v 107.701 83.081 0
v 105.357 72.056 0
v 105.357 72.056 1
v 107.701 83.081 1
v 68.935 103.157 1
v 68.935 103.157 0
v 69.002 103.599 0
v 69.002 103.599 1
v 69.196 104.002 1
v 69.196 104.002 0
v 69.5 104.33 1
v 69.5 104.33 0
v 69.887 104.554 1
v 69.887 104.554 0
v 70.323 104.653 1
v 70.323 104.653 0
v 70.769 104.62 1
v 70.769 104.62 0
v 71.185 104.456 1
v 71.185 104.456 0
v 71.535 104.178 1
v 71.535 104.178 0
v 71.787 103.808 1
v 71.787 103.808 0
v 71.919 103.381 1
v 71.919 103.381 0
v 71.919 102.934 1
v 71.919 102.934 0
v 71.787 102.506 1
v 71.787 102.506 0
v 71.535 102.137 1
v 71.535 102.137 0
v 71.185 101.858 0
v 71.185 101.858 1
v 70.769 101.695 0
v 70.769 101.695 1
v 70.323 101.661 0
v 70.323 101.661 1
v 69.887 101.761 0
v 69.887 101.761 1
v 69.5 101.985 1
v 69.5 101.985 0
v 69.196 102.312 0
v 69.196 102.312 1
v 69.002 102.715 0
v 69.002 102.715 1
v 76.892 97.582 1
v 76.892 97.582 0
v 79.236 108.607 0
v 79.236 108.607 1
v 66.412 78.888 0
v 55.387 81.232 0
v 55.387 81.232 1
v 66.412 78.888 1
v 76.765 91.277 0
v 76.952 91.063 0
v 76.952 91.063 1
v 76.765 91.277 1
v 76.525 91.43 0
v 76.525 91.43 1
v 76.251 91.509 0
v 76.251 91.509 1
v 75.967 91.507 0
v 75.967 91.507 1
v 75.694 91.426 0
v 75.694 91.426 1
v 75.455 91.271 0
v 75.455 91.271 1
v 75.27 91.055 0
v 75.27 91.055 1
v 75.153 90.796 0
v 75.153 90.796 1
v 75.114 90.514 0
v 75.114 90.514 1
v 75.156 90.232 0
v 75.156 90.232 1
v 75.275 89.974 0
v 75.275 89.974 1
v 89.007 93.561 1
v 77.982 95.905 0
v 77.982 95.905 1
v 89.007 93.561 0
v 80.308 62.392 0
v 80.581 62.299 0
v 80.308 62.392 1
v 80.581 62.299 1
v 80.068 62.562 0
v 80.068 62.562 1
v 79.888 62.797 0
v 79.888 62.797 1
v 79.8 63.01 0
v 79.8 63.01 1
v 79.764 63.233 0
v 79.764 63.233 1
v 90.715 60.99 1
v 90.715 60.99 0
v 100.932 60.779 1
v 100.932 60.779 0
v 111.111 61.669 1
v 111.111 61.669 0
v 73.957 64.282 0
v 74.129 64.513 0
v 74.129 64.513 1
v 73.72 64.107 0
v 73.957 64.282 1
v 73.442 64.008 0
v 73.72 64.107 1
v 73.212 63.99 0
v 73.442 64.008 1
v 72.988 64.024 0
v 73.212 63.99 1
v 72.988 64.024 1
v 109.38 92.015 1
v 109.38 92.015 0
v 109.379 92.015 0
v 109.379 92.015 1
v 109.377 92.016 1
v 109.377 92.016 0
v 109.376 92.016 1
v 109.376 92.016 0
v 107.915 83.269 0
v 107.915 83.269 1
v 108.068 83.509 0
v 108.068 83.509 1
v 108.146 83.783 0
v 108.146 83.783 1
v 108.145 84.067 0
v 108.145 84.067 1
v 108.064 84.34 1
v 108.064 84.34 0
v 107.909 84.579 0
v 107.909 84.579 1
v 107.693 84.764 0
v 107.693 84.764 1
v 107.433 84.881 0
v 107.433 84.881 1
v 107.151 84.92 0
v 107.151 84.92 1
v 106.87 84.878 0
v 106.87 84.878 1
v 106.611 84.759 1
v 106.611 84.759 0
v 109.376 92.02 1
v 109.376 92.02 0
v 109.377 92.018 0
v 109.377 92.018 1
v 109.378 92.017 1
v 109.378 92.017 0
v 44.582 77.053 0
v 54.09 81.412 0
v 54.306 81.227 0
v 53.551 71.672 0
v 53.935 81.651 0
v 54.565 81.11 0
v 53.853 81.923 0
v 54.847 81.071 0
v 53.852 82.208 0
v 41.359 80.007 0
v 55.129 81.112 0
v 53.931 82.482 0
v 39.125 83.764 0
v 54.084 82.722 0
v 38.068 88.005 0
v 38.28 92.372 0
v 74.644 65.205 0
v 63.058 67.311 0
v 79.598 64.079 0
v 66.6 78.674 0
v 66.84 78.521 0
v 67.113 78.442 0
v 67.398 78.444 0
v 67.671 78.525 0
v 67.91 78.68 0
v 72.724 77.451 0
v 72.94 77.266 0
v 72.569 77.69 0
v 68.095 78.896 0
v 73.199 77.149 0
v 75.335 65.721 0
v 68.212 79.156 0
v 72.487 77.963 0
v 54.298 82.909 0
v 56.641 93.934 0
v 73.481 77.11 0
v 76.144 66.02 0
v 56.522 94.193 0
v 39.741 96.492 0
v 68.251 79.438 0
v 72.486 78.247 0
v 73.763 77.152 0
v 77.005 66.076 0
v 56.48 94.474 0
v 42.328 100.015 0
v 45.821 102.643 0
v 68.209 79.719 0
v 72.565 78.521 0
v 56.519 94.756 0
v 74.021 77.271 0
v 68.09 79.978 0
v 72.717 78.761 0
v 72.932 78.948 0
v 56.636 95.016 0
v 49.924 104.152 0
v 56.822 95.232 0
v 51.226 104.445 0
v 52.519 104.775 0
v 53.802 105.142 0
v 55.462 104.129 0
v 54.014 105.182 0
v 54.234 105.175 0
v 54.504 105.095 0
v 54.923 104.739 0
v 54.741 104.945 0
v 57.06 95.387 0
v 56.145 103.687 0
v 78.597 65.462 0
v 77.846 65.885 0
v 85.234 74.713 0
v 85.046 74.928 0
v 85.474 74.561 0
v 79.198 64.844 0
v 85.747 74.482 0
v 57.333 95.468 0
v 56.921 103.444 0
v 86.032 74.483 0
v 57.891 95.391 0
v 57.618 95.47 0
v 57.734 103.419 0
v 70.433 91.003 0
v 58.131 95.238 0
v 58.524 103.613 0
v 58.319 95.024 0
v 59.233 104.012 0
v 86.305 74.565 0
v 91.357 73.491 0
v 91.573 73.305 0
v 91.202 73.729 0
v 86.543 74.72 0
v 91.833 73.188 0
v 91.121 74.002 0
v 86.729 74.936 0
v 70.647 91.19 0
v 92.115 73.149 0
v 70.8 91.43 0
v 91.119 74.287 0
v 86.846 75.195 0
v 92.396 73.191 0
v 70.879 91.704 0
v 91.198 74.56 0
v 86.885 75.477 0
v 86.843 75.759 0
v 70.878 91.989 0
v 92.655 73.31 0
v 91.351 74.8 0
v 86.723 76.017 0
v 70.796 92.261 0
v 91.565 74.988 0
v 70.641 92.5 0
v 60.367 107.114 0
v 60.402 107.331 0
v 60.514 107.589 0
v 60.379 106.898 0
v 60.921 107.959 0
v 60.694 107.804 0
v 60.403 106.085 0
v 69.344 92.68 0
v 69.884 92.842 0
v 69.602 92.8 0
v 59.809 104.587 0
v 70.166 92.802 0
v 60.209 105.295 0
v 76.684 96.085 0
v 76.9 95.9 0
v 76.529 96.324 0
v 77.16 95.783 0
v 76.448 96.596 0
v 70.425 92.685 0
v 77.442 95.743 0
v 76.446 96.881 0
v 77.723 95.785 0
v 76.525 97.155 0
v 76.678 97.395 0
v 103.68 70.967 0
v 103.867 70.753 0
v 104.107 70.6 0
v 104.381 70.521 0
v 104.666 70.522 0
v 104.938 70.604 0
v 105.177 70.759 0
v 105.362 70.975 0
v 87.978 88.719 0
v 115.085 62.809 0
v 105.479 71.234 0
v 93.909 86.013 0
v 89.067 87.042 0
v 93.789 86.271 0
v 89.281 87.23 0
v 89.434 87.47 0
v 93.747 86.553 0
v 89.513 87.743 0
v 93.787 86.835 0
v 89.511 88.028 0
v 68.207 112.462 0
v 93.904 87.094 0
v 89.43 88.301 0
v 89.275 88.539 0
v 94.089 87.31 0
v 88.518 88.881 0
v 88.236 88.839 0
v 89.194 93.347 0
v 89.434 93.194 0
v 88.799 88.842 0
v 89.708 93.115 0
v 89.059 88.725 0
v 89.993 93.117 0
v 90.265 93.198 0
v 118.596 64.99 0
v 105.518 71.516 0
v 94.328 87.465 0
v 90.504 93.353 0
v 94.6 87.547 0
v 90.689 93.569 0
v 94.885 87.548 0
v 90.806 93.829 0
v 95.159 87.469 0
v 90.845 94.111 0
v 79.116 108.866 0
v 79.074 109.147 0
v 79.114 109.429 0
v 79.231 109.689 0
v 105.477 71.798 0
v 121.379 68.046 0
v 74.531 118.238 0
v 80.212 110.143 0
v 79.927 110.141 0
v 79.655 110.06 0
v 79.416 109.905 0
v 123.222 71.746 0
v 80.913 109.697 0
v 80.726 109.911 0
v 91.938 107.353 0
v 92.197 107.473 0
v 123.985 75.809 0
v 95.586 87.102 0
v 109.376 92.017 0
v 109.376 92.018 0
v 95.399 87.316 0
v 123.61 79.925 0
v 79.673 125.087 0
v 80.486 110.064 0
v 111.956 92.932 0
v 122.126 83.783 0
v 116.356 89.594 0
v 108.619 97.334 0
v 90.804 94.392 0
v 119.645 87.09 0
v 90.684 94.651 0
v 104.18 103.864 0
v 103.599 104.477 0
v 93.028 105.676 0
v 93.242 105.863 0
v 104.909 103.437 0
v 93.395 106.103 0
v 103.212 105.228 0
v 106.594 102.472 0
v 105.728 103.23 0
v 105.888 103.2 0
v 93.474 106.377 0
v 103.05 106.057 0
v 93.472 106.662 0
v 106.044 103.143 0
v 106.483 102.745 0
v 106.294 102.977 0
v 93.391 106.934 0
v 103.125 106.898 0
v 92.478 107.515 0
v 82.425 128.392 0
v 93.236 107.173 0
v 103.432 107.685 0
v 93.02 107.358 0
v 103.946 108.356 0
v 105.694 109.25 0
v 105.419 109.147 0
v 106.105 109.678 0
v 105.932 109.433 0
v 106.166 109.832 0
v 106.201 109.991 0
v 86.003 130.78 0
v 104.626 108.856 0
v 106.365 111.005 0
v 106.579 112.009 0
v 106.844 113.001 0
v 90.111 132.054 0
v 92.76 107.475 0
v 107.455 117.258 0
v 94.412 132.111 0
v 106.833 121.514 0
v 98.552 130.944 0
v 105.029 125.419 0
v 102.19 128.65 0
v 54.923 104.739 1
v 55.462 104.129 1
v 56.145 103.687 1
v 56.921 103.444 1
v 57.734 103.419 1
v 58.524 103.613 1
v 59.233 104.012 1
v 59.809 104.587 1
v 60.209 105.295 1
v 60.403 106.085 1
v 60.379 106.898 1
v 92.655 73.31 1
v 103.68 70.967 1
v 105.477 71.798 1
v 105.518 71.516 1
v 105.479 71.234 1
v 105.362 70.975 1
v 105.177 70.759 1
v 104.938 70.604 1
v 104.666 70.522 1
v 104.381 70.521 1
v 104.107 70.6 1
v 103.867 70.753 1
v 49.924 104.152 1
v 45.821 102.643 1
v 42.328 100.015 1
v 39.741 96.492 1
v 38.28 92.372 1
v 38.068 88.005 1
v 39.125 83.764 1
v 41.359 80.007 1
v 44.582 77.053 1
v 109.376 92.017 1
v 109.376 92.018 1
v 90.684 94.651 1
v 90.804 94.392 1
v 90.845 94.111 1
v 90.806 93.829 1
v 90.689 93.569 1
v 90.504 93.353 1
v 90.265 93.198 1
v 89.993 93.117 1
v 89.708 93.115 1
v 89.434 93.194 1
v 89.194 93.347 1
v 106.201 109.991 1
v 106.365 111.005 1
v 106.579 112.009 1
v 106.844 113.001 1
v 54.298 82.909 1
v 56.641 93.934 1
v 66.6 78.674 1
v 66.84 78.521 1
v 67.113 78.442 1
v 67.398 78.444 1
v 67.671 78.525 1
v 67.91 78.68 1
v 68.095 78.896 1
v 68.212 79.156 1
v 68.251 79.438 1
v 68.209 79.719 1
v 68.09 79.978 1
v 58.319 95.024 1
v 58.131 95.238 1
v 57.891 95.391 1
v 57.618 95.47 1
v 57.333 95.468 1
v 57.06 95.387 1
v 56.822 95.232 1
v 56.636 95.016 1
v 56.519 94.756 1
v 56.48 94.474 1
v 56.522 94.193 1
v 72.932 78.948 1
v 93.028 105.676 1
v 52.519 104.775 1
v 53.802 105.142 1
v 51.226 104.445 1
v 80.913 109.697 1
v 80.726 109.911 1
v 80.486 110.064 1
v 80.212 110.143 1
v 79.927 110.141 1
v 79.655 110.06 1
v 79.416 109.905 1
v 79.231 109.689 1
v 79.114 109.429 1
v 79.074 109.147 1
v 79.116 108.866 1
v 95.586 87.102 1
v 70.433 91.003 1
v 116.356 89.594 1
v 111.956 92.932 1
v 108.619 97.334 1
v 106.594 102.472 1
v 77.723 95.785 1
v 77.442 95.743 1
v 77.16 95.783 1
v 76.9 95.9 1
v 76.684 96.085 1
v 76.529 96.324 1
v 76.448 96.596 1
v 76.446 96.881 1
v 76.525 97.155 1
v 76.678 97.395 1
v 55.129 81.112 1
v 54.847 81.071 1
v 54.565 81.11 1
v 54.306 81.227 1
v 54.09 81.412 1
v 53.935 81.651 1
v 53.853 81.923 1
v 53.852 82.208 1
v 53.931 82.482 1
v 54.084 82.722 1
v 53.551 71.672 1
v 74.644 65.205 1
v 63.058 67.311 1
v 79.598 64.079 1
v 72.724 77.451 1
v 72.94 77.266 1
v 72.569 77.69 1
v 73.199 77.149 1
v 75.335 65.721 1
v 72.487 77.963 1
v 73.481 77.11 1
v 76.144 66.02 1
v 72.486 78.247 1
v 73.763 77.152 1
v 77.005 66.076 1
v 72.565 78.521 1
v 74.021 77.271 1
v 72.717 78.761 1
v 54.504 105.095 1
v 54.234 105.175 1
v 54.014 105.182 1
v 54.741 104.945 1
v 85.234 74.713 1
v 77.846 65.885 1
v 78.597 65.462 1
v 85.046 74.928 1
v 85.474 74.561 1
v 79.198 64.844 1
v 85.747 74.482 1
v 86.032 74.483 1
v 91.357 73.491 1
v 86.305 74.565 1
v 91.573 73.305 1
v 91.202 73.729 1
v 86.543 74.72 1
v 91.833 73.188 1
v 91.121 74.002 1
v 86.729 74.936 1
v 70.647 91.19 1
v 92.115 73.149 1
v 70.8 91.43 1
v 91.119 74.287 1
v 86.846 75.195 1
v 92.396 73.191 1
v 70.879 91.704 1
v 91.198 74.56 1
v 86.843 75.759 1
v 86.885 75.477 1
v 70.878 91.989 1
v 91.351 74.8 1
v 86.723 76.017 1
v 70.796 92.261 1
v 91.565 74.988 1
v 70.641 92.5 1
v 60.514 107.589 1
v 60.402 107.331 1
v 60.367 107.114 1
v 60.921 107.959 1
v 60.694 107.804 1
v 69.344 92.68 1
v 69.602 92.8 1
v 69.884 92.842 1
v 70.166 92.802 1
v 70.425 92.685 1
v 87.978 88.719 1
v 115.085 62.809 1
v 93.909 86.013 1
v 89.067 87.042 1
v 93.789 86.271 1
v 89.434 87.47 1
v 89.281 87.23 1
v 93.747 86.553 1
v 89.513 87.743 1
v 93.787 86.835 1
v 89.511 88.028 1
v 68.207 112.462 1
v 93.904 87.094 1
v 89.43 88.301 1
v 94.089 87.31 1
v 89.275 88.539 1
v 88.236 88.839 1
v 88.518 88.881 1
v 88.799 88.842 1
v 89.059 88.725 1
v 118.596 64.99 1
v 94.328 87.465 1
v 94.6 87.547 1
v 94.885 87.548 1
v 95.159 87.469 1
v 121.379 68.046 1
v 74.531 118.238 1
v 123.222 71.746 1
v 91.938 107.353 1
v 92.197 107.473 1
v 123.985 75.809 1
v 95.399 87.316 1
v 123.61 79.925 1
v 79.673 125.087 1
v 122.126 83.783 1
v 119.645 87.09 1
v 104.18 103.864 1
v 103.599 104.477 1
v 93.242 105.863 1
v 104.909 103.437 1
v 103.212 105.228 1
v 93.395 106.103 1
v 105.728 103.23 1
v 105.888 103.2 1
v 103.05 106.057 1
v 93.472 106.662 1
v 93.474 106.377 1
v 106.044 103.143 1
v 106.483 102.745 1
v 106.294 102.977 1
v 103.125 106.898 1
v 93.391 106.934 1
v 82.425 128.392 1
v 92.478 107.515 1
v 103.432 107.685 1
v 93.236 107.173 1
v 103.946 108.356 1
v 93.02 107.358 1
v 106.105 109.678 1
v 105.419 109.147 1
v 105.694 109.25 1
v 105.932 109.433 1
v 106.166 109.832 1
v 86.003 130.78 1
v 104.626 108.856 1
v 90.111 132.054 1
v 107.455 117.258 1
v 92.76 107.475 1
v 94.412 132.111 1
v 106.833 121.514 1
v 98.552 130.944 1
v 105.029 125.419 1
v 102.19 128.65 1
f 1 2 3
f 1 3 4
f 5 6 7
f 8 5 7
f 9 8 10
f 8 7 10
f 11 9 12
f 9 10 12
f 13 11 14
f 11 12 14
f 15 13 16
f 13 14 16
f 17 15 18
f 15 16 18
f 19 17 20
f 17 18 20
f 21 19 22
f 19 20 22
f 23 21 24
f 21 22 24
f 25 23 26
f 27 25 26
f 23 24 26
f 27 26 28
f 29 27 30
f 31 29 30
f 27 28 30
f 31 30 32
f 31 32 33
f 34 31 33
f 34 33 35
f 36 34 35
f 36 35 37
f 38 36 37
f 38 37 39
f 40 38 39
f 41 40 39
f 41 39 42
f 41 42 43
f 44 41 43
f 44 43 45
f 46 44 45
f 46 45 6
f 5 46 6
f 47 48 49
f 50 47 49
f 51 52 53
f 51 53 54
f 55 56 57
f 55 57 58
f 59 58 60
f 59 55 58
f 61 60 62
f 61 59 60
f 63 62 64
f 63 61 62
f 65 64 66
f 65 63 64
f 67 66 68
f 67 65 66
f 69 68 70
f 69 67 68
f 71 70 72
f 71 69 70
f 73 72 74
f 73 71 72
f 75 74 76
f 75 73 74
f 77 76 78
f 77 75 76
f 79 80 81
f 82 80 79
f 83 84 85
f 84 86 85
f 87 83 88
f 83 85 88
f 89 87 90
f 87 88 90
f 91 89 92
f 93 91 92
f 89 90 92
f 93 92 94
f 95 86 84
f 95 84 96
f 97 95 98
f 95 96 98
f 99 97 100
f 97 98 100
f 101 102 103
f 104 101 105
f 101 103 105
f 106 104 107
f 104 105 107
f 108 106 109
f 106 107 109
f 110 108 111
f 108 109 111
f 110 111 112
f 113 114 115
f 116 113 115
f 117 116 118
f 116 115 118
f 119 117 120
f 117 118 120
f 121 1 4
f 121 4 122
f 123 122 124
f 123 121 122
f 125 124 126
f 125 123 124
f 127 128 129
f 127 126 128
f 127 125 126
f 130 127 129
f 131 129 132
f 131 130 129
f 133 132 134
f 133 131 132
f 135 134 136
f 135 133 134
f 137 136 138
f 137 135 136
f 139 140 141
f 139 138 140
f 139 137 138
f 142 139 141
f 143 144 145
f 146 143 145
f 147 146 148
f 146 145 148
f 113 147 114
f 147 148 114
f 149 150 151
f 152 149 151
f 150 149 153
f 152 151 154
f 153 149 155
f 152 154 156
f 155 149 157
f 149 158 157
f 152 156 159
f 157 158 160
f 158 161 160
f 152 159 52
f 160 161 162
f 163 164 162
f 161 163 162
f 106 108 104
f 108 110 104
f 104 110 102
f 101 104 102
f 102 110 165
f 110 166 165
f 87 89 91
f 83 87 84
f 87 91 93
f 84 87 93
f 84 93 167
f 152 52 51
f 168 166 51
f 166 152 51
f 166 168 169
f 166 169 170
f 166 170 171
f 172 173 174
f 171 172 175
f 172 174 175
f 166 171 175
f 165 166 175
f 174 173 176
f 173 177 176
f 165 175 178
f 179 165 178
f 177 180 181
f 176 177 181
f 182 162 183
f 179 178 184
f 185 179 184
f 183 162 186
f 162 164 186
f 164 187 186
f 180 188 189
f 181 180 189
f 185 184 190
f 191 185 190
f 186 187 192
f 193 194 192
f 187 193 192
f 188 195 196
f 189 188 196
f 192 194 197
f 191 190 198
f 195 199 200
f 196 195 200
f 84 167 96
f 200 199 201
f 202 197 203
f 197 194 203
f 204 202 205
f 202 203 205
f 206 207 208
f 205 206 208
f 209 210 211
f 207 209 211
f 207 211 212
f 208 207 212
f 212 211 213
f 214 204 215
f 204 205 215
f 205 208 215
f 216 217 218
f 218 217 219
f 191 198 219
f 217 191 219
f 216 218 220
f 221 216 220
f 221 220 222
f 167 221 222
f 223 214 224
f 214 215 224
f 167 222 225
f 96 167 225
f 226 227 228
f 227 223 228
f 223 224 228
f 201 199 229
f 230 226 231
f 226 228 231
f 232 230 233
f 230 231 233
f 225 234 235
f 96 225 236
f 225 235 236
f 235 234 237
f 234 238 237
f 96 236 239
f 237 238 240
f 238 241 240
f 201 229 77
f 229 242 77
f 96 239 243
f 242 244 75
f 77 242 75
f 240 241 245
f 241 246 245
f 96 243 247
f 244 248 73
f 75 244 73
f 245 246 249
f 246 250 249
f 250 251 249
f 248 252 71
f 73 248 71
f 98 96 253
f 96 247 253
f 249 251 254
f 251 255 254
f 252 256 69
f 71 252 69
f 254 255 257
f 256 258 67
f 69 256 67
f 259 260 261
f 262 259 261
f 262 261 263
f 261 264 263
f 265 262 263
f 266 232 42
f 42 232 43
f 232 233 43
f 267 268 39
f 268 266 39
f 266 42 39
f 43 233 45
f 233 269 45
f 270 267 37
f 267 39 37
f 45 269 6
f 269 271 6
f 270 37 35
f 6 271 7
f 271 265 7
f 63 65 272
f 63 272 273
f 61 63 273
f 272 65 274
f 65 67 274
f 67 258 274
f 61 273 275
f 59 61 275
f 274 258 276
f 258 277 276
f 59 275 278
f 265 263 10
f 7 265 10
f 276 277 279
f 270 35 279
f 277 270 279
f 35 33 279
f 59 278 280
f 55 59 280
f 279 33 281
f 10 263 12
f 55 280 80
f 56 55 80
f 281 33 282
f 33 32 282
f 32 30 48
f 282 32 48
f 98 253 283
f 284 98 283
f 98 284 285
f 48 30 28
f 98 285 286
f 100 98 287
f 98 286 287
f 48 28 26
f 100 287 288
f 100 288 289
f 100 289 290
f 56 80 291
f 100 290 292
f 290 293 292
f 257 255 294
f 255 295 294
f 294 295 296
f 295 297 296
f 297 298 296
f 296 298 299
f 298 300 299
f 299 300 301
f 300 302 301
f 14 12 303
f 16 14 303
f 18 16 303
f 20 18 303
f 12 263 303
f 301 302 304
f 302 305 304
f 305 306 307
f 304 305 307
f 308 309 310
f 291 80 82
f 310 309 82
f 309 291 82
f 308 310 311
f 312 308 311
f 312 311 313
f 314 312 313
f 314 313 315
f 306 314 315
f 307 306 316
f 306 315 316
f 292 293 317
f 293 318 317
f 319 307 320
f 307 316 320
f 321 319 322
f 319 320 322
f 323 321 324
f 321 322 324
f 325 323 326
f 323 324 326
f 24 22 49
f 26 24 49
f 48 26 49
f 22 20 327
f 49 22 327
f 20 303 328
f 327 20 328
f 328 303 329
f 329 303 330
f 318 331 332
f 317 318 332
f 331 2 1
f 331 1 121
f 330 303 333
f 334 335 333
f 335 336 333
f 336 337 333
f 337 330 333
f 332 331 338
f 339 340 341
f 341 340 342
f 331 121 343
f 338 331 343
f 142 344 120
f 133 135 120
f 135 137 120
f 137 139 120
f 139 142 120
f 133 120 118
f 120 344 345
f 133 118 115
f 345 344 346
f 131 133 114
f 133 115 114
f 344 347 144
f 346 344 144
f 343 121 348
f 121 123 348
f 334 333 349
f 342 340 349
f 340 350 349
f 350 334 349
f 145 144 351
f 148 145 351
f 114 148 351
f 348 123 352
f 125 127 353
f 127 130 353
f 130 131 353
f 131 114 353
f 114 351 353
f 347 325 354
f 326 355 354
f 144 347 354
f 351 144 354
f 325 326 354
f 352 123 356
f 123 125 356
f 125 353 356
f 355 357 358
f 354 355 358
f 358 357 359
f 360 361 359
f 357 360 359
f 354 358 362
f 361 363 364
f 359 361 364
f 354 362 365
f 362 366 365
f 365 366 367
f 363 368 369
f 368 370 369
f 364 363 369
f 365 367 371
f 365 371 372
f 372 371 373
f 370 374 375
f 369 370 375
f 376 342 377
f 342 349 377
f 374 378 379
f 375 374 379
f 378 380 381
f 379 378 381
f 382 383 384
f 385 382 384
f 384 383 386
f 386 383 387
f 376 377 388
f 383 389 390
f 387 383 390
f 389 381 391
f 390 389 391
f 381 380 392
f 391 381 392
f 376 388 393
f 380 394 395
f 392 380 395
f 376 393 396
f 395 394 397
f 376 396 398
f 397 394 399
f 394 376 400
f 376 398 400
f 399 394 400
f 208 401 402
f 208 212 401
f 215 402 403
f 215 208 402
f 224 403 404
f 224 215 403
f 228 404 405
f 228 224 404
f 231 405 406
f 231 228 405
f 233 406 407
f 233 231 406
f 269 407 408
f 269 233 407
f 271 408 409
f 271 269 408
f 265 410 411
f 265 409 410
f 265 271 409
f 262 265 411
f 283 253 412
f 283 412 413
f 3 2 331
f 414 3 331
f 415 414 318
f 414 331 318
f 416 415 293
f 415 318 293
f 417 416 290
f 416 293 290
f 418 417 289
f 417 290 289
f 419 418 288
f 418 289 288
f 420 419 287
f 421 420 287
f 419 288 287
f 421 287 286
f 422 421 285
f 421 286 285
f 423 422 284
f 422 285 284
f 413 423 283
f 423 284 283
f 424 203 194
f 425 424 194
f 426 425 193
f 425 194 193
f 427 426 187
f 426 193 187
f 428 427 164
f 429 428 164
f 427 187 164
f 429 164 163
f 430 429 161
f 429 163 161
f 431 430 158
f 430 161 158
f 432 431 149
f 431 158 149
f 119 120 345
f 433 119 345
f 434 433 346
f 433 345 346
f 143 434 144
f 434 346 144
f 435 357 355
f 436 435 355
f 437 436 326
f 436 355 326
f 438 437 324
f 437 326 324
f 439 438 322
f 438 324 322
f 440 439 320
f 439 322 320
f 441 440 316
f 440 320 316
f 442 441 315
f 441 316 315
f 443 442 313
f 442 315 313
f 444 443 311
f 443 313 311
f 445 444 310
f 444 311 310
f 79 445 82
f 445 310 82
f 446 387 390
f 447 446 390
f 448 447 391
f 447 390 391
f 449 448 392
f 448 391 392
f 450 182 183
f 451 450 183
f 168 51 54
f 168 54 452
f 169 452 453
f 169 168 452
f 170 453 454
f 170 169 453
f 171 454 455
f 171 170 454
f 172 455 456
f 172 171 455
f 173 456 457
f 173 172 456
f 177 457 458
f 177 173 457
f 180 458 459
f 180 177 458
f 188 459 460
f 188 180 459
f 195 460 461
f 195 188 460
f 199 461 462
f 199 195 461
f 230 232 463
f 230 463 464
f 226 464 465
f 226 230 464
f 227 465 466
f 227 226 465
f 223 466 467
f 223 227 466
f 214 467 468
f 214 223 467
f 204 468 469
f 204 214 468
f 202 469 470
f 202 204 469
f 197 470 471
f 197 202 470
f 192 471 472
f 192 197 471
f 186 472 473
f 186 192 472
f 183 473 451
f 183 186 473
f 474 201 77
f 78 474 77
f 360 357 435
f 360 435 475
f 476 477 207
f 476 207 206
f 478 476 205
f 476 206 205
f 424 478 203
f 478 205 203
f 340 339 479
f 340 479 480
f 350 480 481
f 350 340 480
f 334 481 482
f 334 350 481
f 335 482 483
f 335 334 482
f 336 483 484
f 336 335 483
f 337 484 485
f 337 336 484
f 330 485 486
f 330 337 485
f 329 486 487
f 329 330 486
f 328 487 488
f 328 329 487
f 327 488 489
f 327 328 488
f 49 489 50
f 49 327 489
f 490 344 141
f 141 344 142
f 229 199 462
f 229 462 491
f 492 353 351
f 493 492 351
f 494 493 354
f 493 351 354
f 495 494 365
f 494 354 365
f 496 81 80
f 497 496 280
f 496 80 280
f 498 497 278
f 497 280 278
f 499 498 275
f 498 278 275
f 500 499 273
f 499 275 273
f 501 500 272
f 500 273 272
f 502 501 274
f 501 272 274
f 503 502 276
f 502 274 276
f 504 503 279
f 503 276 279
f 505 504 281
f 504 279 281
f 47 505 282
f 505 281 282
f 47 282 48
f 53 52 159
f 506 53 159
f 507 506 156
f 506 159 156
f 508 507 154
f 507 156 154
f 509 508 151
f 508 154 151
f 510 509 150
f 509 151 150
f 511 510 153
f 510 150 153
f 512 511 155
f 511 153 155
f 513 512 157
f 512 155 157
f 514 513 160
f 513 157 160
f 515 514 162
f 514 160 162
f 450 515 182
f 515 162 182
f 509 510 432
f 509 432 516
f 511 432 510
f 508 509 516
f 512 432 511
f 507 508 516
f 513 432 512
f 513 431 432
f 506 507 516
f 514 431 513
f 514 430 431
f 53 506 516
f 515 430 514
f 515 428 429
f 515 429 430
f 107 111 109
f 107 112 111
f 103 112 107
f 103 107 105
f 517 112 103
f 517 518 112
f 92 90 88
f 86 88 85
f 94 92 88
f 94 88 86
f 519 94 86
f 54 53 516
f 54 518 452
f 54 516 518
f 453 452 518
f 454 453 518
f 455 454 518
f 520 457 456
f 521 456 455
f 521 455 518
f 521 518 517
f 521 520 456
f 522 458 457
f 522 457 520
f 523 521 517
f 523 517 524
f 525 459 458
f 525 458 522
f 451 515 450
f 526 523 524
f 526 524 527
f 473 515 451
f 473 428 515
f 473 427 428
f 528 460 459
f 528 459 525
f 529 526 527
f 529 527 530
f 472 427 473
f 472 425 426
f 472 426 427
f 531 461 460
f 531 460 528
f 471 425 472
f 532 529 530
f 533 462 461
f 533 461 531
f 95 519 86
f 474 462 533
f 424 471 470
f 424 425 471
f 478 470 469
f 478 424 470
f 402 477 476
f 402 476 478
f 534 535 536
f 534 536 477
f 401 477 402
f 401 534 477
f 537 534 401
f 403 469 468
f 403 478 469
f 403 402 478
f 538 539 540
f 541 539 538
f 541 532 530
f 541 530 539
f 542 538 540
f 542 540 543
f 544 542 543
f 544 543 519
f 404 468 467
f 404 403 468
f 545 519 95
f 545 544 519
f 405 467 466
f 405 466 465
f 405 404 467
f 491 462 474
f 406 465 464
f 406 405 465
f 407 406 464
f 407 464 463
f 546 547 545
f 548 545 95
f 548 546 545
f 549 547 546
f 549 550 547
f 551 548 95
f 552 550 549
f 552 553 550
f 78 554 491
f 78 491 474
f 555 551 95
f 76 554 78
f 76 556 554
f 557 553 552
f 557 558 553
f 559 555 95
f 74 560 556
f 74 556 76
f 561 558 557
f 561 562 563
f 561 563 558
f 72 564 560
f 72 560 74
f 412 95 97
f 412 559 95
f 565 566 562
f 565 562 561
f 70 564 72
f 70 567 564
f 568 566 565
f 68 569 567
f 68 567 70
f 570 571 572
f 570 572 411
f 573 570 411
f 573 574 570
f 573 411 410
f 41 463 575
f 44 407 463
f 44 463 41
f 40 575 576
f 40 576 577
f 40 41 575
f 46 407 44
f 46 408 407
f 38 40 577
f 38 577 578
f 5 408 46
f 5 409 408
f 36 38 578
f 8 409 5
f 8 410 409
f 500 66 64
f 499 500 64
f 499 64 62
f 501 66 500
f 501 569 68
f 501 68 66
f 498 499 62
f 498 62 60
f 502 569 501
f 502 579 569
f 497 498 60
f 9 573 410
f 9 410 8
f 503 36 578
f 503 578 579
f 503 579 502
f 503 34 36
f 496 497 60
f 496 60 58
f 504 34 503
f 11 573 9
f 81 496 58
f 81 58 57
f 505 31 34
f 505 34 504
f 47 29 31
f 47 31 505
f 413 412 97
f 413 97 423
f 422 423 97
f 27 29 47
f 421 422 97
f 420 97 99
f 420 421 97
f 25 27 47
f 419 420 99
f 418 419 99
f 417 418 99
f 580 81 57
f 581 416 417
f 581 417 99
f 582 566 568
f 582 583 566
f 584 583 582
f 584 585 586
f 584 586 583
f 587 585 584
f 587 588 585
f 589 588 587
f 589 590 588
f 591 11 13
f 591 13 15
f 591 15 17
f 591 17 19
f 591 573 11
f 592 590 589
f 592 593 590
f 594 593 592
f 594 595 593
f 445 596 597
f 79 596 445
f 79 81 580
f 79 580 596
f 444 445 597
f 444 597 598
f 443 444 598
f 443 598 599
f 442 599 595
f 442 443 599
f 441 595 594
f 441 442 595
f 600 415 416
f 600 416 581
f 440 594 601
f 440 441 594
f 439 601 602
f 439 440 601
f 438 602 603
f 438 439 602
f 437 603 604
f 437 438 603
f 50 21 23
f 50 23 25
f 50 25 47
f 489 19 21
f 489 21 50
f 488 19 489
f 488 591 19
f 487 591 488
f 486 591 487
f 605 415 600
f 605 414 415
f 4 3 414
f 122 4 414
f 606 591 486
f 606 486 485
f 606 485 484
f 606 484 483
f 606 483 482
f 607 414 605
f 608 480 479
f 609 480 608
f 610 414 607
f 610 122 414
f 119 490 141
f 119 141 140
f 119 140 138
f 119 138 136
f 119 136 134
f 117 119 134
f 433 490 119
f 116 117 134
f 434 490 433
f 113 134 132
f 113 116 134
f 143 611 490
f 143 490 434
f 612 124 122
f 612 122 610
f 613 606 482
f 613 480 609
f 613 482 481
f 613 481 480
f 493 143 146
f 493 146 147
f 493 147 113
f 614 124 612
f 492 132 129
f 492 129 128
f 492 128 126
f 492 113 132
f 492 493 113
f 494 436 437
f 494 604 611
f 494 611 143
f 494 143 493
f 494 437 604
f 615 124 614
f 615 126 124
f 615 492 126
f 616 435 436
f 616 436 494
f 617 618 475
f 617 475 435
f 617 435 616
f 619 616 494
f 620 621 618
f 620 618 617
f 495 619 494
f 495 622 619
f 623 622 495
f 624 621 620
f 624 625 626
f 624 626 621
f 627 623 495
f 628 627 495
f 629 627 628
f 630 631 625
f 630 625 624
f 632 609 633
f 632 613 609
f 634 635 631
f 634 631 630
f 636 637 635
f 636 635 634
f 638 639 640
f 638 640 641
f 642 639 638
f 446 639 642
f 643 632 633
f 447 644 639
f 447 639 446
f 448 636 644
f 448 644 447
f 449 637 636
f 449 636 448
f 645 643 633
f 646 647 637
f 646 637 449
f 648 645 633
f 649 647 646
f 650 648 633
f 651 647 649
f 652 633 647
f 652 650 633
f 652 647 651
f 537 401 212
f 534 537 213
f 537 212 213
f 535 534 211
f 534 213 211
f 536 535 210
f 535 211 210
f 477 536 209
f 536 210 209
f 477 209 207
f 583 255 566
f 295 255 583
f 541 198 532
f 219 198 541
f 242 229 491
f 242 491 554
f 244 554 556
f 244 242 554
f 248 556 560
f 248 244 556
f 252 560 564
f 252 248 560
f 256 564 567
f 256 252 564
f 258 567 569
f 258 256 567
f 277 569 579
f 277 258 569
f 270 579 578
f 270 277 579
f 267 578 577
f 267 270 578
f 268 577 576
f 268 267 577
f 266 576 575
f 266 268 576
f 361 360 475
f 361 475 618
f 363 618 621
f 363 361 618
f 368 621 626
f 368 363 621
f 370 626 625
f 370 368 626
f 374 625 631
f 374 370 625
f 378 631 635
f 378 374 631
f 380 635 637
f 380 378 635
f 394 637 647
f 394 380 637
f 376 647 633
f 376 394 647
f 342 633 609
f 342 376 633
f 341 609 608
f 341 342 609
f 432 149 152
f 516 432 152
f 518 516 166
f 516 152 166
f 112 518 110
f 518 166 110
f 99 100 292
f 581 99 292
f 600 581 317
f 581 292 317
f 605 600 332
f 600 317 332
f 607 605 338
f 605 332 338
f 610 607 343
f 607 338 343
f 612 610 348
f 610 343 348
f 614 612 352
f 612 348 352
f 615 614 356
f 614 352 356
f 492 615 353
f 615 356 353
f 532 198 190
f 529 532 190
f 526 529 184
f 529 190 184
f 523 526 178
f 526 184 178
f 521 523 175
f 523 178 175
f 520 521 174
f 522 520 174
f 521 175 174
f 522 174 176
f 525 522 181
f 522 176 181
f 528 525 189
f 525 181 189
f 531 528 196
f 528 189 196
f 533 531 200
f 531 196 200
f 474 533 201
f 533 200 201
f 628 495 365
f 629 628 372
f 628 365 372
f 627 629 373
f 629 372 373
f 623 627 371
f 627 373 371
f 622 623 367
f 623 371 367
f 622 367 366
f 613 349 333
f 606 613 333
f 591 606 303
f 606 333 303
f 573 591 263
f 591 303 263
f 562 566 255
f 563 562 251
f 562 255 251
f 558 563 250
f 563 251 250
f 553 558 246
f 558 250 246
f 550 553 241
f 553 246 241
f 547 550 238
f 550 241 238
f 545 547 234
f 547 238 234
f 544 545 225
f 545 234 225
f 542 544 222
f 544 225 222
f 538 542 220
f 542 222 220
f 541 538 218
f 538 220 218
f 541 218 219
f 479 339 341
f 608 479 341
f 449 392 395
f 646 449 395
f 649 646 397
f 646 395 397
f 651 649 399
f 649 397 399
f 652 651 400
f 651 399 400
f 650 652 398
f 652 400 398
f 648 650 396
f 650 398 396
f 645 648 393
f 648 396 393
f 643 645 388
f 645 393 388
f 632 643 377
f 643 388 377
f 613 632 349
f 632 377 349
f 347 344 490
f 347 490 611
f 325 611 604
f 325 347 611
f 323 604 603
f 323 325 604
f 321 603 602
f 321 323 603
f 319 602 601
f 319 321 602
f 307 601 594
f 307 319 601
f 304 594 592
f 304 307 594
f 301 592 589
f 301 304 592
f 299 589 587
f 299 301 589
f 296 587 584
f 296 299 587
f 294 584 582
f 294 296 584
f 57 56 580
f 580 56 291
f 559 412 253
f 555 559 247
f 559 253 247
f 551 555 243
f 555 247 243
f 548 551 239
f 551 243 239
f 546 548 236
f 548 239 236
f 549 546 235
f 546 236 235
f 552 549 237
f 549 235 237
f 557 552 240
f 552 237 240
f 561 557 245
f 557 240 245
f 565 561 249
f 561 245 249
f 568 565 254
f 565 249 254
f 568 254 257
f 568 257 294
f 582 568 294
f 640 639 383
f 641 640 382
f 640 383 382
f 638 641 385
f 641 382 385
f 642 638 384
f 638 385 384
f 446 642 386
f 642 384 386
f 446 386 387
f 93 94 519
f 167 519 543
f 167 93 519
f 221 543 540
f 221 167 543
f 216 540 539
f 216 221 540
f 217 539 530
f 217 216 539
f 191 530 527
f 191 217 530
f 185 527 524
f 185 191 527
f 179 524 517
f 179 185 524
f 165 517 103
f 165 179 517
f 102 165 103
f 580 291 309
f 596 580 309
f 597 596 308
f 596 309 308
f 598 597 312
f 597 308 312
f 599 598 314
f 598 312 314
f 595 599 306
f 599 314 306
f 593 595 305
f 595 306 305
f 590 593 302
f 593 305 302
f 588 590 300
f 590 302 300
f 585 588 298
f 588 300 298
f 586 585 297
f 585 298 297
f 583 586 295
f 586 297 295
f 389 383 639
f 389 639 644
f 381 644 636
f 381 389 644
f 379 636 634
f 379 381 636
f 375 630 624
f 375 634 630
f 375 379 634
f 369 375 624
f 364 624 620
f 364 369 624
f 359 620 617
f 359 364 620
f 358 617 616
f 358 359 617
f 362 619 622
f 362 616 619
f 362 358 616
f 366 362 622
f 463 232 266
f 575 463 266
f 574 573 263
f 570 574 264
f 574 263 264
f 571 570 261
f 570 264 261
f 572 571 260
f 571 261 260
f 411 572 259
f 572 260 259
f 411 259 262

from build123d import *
from build123d.topology import SkipClean

# Parameters (mm, degrees)
BOSS_EXTRUDE1_DEPTH   = 1
SKETCH8_3_R           = 3
CUT_EXTRUDE1_DEPTH    = 182.285837692
CUT_EXTRUDE2_DEPTH    = 182.285837692
SKETCH10_W            = 14.1
SKETCH10_H            = 14.1
CUT_EXTRUDE3_DEPTH    = 185.637780297
F_3_0MM_DOWEL_HOLE1_D = 3
FILLET1_R             = 1


with BuildPart() as part:
    # Sketch8 → Boss-Extrude1 (new body)
    with BuildSketch(Plane.XY):
        with BuildLine():
            ThreePointArc((73.852303576, 63.794594289), (73.863549821, 63.839319131), (73.875482243, 63.883865813))
            ThreePointArc((73.875482243, 63.883865813), (76.767270103, 63.085390407), (79.729789892, 62.612657392))
            ThreePointArc((79.729789892, 62.612657392), (79.717062502, 62.538833177), (79.702495752, 62.465349771))
            ThreePointArc((79.702495752, 62.465349771), (95.373691885, 60.7573177), (111.111302129, 61.669121188))
            ThreePointArc((111.111302129, 61.669121188), (123.74416397, 73.75113123), (116.356165737, 89.593531525))
            ThreePointArc((116.356165737, 89.593531525), (107.510169126, 99.635128091), (106.844308874, 113.000828513))
            ThreePointArc((106.844308874, 113.000828513), (98.551785503, 130.943955248), (79.67265081, 125.087333856))
            ThreePointArc((79.67265081, 125.087333856), (66.957923375, 111.551078569), (49.923987164, 104.152462611))
            ThreePointArc((49.923987164, 104.152462611), (38.279791522, 92.371702096), (44.581782069, 77.053134095))
            ThreePointArc((44.581782069, 77.053134095), (58.651333394, 69.17496271), (73.852303576, 63.794594289))
        make_face()
        with BuildLine():
            ThreePointArc((56.72077423, 104.000844147), (56.721683918, 104.00117089), (56.7225936, 104.001497652))
            ThreePointArc((56.7225936, 104.001497652), (56.755397532, 103.992206145), (56.788325126, 103.983362865))
            ThreePointArc((56.788325126, 103.983362865), (56.754559843, 103.992142785), (56.72077423, 104.000844147))
        make_face(mode=Mode.SUBTRACT)
        with BuildLine():
            ThreePointArc((109.376341775, 92.015545509), (109.37615287, 92.017539878), (109.375963817, 92.019534234))
            ThreePointArc((109.375963817, 92.019534234), (109.377797318, 92.017499849), (109.379631064, 92.015465685))
            ThreePointArc((109.379631064, 92.015465685), (109.377986421, 92.015505684), (109.376341775, 92.015545509))
        make_face(mode=Mode.SUBTRACT)
        with BuildLine():
            ThreePointArc((103.532400156, 106.396636288), (103.543227812, 106.407709628), (103.554044399, 106.418793781))
            ThreePointArc((103.554044399, 106.418793781), (103.552293137, 106.396310438), (103.550744757, 106.373812212))
            ThreePointArc((103.550744757, 106.373812212), (103.541575551, 106.385226737), (103.532400156, 106.396636288))
        make_face(mode=Mode.SUBTRACT)
        with BuildLine():
            ThreePointArc((104.021801646, 107.681154775), (104.021865069, 107.684582448), (104.021929019, 107.688010111))
            ThreePointArc((104.021929019, 107.688010111), (104.063142491, 107.7381429), (104.104138674, 107.788453533))
            ThreePointArc((104.104138674, 107.788453533), (104.062244422, 107.735361058), (104.021801646, 107.681154775))
        make_face(mode=Mode.SUBTRACT)
    extrude(amount=BOSS_EXTRUDE1_DEPTH)

    # Sketch8<3> → Cut-Extrude1 (cut, through all)
    with SkipClean():  # the faces are left unmerged after this step: merging them gives an invalid solid
        with BuildSketch(Plane.XY):
            with Locations((106.04559389, 106.21341333)):
                Circle(SKETCH8_3_R)
            with Locations((76.767270103, 63.085390407)):
                Circle(SKETCH8_3_R)
            with Locations((57.420286528, 106.402169345)):
                Circle(SKETCH8_3_R)
        extrude(amount=CUT_EXTRUDE1_DEPTH, mode=Mode.SUBTRACT)

    # Sketch14 → Cut-Extrude2 (cut, through all)
    with SkipClean():  # the faces are left unmerged after this step: merging them gives an invalid solid
        with BuildSketch(Plane.XY):
            with BuildLine():
                Line((54.297852906, 82.909160119), (55.387130976, 81.231818983))
                ThreePointArc((55.387130976, 81.231818983), (54.003821373, 81.525850516), (54.297852906, 82.909160119))
            make_face()
            with BuildLine():
                Line((56.641344681, 93.934422083), (58.318685817, 95.023700153))
                ThreePointArc((58.318685817, 95.023700153), (56.935376214, 95.317731686), (56.641344681, 93.934422083))
            make_face()
            with BuildLine():
                Line((69.343947781, 92.680208378), (70.433225851, 91.002867242))
                ThreePointArc((70.433225851, 91.002867242), (70.727257384, 92.386176845), (69.343947781, 92.680208378))
            make_face()
            with BuildLine():
                Line((68.089734077, 79.977605278), (66.412392941, 78.888327208))
                ThreePointArc((66.412392941, 78.888327208), (67.795702544, 78.594295675), (68.089734077, 79.977605278))
            make_face()
            with BuildLine():
                Line((75.275056475, 89.973704373), (76.952397611, 91.062982443))
                ThreePointArc((76.952397611, 91.062982443), (75.569088008, 91.357013976), (75.275056475, 89.973704373))
            make_face()
            with BuildLine():
                Line((72.9315647, 78.948442409), (74.02084277, 77.271101273))
                ThreePointArc((74.02084277, 77.271101273), (72.637533167, 77.565132806), (72.9315647, 78.948442409))
            make_face()
            with BuildLine():
                Line((85.046104735, 74.927609498), (86.723445871, 76.016887568))
                ThreePointArc((86.723445871, 76.016887568), (86.429414338, 74.633577965), (85.046104735, 74.927609498))
            make_face()
            with BuildLine():
                Line((89.066937645, 87.042149532), (87.977659575, 88.719490668))
                ThreePointArc((87.977659575, 88.719490668), (89.360969178, 88.425459135), (89.066937645, 87.042149532))
            make_face()
            with BuildLine():
                Line((89.006822445, 93.561321292), (90.684163581, 94.650599362))
                ThreePointArc((90.684163581, 94.650599362), (90.390132048, 93.267289759), (89.006822445, 93.561321292))
            make_face()
            with BuildLine():
                Line((76.89228241, 97.582154203), (77.981560481, 95.904813067))
                ThreePointArc((77.981560481, 95.904813067), (76.598250878, 96.1988446), (76.89228241, 97.582154203))
            make_face()
            with BuildLine():
                Line((91.938377285, 107.353202462), (93.027655356, 105.675861326))
                ThreePointArc((93.027655356, 105.675861326), (93.321686888, 107.059170929), (91.938377285, 107.353202462))
            make_face()
            with BuildLine():
                Line((79.235774185, 108.607416167), (80.913115321, 109.696694237))
                ThreePointArc((80.913115321, 109.696694237), (79.529805718, 109.99072577), (79.235774185, 108.607416167))
            make_face()
            with BuildLine():
                Line((93.908768269, 86.012986663), (95.586109405, 87.102264733))
                ThreePointArc((95.586109405, 87.102264733), (94.202799802, 87.396296266), (93.908768269, 86.012986663))
            make_face()
            with BuildLine():
                Line((91.565276494, 74.987724698), (92.654554564, 73.310383563))
                ThreePointArc((92.654554564, 73.310383563), (91.271244961, 73.604415095), (91.565276494, 74.987724698))
            make_face()
            with BuildLine():
                Line((103.679816529, 70.966891788), (105.357157665, 72.056169858))
                ThreePointArc((105.357157665, 72.056169858), (105.063126132, 70.672860255), (103.679816529, 70.966891788))
            make_face()
            with BuildLine():
                Line((106.611371369, 84.758772958), (107.700649439, 83.081431822))
                ThreePointArc((107.700649439, 83.081431822), (107.994680972, 84.464741425), (106.611371369, 84.758772958))
            make_face()
        extrude(amount=CUT_EXTRUDE2_DEPTH, mode=Mode.SUBTRACT)

    # Sketch10 → Cut-Extrude3 (cut, through all)
    with SkipClean():  # the faces are left unmerged after this step: merging them gives an invalid solid
        with BuildSketch(Plane(origin=(-22.098060608, 19.345391025, 0), x_dir=(0.9781476007338056, -0.2079116908177598, 0), z_dir=(0, 0, 1))):
            with Locations((68.560828803, 83.69413822)):
                Rectangle(SKETCH10_W, SKETCH10_H)
            with Locations((87.610828803, 83.69413822)):
                Rectangle(SKETCH10_W, SKETCH10_H)
            with Locations((106.660828803, 83.69413822)):
                Rectangle(SKETCH10_W, SKETCH10_H)
            with Locations((87.610828803, 102.74413822)):
                Rectangle(SKETCH10_W, SKETCH10_H)
        extrude(amount=CUT_EXTRUDE3_DEPTH, mode=Mode.SUBTRACT)

    # Ø3.0mm Dowel Hole1 (through all)
    with Locations(Plane.XY.offset(1)):
        with Locations((70.435309654, 103.157249982)):
            Hole(F_3_0MM_DOWEL_HOLE1_D / 2)

    # Fillet1
    fillet1_edges = [part.edges().sort_by_distance(p)[0] for p in [
        (79.702495752, 62.465349771, 0.5),
        (73.852303576, 63.794594289, 0.5),
        (106.42311517, 103.237261841, 0.5),
        (106.111211206, 109.212695638, 0.5),
        (54.596217873, 105.389926178, 0.5),
        (60.17229201, 107.596516793, 0.5),
    ]]
    fillet(fillet1_edges, radius=FILLET1_R)


solid = part.part
